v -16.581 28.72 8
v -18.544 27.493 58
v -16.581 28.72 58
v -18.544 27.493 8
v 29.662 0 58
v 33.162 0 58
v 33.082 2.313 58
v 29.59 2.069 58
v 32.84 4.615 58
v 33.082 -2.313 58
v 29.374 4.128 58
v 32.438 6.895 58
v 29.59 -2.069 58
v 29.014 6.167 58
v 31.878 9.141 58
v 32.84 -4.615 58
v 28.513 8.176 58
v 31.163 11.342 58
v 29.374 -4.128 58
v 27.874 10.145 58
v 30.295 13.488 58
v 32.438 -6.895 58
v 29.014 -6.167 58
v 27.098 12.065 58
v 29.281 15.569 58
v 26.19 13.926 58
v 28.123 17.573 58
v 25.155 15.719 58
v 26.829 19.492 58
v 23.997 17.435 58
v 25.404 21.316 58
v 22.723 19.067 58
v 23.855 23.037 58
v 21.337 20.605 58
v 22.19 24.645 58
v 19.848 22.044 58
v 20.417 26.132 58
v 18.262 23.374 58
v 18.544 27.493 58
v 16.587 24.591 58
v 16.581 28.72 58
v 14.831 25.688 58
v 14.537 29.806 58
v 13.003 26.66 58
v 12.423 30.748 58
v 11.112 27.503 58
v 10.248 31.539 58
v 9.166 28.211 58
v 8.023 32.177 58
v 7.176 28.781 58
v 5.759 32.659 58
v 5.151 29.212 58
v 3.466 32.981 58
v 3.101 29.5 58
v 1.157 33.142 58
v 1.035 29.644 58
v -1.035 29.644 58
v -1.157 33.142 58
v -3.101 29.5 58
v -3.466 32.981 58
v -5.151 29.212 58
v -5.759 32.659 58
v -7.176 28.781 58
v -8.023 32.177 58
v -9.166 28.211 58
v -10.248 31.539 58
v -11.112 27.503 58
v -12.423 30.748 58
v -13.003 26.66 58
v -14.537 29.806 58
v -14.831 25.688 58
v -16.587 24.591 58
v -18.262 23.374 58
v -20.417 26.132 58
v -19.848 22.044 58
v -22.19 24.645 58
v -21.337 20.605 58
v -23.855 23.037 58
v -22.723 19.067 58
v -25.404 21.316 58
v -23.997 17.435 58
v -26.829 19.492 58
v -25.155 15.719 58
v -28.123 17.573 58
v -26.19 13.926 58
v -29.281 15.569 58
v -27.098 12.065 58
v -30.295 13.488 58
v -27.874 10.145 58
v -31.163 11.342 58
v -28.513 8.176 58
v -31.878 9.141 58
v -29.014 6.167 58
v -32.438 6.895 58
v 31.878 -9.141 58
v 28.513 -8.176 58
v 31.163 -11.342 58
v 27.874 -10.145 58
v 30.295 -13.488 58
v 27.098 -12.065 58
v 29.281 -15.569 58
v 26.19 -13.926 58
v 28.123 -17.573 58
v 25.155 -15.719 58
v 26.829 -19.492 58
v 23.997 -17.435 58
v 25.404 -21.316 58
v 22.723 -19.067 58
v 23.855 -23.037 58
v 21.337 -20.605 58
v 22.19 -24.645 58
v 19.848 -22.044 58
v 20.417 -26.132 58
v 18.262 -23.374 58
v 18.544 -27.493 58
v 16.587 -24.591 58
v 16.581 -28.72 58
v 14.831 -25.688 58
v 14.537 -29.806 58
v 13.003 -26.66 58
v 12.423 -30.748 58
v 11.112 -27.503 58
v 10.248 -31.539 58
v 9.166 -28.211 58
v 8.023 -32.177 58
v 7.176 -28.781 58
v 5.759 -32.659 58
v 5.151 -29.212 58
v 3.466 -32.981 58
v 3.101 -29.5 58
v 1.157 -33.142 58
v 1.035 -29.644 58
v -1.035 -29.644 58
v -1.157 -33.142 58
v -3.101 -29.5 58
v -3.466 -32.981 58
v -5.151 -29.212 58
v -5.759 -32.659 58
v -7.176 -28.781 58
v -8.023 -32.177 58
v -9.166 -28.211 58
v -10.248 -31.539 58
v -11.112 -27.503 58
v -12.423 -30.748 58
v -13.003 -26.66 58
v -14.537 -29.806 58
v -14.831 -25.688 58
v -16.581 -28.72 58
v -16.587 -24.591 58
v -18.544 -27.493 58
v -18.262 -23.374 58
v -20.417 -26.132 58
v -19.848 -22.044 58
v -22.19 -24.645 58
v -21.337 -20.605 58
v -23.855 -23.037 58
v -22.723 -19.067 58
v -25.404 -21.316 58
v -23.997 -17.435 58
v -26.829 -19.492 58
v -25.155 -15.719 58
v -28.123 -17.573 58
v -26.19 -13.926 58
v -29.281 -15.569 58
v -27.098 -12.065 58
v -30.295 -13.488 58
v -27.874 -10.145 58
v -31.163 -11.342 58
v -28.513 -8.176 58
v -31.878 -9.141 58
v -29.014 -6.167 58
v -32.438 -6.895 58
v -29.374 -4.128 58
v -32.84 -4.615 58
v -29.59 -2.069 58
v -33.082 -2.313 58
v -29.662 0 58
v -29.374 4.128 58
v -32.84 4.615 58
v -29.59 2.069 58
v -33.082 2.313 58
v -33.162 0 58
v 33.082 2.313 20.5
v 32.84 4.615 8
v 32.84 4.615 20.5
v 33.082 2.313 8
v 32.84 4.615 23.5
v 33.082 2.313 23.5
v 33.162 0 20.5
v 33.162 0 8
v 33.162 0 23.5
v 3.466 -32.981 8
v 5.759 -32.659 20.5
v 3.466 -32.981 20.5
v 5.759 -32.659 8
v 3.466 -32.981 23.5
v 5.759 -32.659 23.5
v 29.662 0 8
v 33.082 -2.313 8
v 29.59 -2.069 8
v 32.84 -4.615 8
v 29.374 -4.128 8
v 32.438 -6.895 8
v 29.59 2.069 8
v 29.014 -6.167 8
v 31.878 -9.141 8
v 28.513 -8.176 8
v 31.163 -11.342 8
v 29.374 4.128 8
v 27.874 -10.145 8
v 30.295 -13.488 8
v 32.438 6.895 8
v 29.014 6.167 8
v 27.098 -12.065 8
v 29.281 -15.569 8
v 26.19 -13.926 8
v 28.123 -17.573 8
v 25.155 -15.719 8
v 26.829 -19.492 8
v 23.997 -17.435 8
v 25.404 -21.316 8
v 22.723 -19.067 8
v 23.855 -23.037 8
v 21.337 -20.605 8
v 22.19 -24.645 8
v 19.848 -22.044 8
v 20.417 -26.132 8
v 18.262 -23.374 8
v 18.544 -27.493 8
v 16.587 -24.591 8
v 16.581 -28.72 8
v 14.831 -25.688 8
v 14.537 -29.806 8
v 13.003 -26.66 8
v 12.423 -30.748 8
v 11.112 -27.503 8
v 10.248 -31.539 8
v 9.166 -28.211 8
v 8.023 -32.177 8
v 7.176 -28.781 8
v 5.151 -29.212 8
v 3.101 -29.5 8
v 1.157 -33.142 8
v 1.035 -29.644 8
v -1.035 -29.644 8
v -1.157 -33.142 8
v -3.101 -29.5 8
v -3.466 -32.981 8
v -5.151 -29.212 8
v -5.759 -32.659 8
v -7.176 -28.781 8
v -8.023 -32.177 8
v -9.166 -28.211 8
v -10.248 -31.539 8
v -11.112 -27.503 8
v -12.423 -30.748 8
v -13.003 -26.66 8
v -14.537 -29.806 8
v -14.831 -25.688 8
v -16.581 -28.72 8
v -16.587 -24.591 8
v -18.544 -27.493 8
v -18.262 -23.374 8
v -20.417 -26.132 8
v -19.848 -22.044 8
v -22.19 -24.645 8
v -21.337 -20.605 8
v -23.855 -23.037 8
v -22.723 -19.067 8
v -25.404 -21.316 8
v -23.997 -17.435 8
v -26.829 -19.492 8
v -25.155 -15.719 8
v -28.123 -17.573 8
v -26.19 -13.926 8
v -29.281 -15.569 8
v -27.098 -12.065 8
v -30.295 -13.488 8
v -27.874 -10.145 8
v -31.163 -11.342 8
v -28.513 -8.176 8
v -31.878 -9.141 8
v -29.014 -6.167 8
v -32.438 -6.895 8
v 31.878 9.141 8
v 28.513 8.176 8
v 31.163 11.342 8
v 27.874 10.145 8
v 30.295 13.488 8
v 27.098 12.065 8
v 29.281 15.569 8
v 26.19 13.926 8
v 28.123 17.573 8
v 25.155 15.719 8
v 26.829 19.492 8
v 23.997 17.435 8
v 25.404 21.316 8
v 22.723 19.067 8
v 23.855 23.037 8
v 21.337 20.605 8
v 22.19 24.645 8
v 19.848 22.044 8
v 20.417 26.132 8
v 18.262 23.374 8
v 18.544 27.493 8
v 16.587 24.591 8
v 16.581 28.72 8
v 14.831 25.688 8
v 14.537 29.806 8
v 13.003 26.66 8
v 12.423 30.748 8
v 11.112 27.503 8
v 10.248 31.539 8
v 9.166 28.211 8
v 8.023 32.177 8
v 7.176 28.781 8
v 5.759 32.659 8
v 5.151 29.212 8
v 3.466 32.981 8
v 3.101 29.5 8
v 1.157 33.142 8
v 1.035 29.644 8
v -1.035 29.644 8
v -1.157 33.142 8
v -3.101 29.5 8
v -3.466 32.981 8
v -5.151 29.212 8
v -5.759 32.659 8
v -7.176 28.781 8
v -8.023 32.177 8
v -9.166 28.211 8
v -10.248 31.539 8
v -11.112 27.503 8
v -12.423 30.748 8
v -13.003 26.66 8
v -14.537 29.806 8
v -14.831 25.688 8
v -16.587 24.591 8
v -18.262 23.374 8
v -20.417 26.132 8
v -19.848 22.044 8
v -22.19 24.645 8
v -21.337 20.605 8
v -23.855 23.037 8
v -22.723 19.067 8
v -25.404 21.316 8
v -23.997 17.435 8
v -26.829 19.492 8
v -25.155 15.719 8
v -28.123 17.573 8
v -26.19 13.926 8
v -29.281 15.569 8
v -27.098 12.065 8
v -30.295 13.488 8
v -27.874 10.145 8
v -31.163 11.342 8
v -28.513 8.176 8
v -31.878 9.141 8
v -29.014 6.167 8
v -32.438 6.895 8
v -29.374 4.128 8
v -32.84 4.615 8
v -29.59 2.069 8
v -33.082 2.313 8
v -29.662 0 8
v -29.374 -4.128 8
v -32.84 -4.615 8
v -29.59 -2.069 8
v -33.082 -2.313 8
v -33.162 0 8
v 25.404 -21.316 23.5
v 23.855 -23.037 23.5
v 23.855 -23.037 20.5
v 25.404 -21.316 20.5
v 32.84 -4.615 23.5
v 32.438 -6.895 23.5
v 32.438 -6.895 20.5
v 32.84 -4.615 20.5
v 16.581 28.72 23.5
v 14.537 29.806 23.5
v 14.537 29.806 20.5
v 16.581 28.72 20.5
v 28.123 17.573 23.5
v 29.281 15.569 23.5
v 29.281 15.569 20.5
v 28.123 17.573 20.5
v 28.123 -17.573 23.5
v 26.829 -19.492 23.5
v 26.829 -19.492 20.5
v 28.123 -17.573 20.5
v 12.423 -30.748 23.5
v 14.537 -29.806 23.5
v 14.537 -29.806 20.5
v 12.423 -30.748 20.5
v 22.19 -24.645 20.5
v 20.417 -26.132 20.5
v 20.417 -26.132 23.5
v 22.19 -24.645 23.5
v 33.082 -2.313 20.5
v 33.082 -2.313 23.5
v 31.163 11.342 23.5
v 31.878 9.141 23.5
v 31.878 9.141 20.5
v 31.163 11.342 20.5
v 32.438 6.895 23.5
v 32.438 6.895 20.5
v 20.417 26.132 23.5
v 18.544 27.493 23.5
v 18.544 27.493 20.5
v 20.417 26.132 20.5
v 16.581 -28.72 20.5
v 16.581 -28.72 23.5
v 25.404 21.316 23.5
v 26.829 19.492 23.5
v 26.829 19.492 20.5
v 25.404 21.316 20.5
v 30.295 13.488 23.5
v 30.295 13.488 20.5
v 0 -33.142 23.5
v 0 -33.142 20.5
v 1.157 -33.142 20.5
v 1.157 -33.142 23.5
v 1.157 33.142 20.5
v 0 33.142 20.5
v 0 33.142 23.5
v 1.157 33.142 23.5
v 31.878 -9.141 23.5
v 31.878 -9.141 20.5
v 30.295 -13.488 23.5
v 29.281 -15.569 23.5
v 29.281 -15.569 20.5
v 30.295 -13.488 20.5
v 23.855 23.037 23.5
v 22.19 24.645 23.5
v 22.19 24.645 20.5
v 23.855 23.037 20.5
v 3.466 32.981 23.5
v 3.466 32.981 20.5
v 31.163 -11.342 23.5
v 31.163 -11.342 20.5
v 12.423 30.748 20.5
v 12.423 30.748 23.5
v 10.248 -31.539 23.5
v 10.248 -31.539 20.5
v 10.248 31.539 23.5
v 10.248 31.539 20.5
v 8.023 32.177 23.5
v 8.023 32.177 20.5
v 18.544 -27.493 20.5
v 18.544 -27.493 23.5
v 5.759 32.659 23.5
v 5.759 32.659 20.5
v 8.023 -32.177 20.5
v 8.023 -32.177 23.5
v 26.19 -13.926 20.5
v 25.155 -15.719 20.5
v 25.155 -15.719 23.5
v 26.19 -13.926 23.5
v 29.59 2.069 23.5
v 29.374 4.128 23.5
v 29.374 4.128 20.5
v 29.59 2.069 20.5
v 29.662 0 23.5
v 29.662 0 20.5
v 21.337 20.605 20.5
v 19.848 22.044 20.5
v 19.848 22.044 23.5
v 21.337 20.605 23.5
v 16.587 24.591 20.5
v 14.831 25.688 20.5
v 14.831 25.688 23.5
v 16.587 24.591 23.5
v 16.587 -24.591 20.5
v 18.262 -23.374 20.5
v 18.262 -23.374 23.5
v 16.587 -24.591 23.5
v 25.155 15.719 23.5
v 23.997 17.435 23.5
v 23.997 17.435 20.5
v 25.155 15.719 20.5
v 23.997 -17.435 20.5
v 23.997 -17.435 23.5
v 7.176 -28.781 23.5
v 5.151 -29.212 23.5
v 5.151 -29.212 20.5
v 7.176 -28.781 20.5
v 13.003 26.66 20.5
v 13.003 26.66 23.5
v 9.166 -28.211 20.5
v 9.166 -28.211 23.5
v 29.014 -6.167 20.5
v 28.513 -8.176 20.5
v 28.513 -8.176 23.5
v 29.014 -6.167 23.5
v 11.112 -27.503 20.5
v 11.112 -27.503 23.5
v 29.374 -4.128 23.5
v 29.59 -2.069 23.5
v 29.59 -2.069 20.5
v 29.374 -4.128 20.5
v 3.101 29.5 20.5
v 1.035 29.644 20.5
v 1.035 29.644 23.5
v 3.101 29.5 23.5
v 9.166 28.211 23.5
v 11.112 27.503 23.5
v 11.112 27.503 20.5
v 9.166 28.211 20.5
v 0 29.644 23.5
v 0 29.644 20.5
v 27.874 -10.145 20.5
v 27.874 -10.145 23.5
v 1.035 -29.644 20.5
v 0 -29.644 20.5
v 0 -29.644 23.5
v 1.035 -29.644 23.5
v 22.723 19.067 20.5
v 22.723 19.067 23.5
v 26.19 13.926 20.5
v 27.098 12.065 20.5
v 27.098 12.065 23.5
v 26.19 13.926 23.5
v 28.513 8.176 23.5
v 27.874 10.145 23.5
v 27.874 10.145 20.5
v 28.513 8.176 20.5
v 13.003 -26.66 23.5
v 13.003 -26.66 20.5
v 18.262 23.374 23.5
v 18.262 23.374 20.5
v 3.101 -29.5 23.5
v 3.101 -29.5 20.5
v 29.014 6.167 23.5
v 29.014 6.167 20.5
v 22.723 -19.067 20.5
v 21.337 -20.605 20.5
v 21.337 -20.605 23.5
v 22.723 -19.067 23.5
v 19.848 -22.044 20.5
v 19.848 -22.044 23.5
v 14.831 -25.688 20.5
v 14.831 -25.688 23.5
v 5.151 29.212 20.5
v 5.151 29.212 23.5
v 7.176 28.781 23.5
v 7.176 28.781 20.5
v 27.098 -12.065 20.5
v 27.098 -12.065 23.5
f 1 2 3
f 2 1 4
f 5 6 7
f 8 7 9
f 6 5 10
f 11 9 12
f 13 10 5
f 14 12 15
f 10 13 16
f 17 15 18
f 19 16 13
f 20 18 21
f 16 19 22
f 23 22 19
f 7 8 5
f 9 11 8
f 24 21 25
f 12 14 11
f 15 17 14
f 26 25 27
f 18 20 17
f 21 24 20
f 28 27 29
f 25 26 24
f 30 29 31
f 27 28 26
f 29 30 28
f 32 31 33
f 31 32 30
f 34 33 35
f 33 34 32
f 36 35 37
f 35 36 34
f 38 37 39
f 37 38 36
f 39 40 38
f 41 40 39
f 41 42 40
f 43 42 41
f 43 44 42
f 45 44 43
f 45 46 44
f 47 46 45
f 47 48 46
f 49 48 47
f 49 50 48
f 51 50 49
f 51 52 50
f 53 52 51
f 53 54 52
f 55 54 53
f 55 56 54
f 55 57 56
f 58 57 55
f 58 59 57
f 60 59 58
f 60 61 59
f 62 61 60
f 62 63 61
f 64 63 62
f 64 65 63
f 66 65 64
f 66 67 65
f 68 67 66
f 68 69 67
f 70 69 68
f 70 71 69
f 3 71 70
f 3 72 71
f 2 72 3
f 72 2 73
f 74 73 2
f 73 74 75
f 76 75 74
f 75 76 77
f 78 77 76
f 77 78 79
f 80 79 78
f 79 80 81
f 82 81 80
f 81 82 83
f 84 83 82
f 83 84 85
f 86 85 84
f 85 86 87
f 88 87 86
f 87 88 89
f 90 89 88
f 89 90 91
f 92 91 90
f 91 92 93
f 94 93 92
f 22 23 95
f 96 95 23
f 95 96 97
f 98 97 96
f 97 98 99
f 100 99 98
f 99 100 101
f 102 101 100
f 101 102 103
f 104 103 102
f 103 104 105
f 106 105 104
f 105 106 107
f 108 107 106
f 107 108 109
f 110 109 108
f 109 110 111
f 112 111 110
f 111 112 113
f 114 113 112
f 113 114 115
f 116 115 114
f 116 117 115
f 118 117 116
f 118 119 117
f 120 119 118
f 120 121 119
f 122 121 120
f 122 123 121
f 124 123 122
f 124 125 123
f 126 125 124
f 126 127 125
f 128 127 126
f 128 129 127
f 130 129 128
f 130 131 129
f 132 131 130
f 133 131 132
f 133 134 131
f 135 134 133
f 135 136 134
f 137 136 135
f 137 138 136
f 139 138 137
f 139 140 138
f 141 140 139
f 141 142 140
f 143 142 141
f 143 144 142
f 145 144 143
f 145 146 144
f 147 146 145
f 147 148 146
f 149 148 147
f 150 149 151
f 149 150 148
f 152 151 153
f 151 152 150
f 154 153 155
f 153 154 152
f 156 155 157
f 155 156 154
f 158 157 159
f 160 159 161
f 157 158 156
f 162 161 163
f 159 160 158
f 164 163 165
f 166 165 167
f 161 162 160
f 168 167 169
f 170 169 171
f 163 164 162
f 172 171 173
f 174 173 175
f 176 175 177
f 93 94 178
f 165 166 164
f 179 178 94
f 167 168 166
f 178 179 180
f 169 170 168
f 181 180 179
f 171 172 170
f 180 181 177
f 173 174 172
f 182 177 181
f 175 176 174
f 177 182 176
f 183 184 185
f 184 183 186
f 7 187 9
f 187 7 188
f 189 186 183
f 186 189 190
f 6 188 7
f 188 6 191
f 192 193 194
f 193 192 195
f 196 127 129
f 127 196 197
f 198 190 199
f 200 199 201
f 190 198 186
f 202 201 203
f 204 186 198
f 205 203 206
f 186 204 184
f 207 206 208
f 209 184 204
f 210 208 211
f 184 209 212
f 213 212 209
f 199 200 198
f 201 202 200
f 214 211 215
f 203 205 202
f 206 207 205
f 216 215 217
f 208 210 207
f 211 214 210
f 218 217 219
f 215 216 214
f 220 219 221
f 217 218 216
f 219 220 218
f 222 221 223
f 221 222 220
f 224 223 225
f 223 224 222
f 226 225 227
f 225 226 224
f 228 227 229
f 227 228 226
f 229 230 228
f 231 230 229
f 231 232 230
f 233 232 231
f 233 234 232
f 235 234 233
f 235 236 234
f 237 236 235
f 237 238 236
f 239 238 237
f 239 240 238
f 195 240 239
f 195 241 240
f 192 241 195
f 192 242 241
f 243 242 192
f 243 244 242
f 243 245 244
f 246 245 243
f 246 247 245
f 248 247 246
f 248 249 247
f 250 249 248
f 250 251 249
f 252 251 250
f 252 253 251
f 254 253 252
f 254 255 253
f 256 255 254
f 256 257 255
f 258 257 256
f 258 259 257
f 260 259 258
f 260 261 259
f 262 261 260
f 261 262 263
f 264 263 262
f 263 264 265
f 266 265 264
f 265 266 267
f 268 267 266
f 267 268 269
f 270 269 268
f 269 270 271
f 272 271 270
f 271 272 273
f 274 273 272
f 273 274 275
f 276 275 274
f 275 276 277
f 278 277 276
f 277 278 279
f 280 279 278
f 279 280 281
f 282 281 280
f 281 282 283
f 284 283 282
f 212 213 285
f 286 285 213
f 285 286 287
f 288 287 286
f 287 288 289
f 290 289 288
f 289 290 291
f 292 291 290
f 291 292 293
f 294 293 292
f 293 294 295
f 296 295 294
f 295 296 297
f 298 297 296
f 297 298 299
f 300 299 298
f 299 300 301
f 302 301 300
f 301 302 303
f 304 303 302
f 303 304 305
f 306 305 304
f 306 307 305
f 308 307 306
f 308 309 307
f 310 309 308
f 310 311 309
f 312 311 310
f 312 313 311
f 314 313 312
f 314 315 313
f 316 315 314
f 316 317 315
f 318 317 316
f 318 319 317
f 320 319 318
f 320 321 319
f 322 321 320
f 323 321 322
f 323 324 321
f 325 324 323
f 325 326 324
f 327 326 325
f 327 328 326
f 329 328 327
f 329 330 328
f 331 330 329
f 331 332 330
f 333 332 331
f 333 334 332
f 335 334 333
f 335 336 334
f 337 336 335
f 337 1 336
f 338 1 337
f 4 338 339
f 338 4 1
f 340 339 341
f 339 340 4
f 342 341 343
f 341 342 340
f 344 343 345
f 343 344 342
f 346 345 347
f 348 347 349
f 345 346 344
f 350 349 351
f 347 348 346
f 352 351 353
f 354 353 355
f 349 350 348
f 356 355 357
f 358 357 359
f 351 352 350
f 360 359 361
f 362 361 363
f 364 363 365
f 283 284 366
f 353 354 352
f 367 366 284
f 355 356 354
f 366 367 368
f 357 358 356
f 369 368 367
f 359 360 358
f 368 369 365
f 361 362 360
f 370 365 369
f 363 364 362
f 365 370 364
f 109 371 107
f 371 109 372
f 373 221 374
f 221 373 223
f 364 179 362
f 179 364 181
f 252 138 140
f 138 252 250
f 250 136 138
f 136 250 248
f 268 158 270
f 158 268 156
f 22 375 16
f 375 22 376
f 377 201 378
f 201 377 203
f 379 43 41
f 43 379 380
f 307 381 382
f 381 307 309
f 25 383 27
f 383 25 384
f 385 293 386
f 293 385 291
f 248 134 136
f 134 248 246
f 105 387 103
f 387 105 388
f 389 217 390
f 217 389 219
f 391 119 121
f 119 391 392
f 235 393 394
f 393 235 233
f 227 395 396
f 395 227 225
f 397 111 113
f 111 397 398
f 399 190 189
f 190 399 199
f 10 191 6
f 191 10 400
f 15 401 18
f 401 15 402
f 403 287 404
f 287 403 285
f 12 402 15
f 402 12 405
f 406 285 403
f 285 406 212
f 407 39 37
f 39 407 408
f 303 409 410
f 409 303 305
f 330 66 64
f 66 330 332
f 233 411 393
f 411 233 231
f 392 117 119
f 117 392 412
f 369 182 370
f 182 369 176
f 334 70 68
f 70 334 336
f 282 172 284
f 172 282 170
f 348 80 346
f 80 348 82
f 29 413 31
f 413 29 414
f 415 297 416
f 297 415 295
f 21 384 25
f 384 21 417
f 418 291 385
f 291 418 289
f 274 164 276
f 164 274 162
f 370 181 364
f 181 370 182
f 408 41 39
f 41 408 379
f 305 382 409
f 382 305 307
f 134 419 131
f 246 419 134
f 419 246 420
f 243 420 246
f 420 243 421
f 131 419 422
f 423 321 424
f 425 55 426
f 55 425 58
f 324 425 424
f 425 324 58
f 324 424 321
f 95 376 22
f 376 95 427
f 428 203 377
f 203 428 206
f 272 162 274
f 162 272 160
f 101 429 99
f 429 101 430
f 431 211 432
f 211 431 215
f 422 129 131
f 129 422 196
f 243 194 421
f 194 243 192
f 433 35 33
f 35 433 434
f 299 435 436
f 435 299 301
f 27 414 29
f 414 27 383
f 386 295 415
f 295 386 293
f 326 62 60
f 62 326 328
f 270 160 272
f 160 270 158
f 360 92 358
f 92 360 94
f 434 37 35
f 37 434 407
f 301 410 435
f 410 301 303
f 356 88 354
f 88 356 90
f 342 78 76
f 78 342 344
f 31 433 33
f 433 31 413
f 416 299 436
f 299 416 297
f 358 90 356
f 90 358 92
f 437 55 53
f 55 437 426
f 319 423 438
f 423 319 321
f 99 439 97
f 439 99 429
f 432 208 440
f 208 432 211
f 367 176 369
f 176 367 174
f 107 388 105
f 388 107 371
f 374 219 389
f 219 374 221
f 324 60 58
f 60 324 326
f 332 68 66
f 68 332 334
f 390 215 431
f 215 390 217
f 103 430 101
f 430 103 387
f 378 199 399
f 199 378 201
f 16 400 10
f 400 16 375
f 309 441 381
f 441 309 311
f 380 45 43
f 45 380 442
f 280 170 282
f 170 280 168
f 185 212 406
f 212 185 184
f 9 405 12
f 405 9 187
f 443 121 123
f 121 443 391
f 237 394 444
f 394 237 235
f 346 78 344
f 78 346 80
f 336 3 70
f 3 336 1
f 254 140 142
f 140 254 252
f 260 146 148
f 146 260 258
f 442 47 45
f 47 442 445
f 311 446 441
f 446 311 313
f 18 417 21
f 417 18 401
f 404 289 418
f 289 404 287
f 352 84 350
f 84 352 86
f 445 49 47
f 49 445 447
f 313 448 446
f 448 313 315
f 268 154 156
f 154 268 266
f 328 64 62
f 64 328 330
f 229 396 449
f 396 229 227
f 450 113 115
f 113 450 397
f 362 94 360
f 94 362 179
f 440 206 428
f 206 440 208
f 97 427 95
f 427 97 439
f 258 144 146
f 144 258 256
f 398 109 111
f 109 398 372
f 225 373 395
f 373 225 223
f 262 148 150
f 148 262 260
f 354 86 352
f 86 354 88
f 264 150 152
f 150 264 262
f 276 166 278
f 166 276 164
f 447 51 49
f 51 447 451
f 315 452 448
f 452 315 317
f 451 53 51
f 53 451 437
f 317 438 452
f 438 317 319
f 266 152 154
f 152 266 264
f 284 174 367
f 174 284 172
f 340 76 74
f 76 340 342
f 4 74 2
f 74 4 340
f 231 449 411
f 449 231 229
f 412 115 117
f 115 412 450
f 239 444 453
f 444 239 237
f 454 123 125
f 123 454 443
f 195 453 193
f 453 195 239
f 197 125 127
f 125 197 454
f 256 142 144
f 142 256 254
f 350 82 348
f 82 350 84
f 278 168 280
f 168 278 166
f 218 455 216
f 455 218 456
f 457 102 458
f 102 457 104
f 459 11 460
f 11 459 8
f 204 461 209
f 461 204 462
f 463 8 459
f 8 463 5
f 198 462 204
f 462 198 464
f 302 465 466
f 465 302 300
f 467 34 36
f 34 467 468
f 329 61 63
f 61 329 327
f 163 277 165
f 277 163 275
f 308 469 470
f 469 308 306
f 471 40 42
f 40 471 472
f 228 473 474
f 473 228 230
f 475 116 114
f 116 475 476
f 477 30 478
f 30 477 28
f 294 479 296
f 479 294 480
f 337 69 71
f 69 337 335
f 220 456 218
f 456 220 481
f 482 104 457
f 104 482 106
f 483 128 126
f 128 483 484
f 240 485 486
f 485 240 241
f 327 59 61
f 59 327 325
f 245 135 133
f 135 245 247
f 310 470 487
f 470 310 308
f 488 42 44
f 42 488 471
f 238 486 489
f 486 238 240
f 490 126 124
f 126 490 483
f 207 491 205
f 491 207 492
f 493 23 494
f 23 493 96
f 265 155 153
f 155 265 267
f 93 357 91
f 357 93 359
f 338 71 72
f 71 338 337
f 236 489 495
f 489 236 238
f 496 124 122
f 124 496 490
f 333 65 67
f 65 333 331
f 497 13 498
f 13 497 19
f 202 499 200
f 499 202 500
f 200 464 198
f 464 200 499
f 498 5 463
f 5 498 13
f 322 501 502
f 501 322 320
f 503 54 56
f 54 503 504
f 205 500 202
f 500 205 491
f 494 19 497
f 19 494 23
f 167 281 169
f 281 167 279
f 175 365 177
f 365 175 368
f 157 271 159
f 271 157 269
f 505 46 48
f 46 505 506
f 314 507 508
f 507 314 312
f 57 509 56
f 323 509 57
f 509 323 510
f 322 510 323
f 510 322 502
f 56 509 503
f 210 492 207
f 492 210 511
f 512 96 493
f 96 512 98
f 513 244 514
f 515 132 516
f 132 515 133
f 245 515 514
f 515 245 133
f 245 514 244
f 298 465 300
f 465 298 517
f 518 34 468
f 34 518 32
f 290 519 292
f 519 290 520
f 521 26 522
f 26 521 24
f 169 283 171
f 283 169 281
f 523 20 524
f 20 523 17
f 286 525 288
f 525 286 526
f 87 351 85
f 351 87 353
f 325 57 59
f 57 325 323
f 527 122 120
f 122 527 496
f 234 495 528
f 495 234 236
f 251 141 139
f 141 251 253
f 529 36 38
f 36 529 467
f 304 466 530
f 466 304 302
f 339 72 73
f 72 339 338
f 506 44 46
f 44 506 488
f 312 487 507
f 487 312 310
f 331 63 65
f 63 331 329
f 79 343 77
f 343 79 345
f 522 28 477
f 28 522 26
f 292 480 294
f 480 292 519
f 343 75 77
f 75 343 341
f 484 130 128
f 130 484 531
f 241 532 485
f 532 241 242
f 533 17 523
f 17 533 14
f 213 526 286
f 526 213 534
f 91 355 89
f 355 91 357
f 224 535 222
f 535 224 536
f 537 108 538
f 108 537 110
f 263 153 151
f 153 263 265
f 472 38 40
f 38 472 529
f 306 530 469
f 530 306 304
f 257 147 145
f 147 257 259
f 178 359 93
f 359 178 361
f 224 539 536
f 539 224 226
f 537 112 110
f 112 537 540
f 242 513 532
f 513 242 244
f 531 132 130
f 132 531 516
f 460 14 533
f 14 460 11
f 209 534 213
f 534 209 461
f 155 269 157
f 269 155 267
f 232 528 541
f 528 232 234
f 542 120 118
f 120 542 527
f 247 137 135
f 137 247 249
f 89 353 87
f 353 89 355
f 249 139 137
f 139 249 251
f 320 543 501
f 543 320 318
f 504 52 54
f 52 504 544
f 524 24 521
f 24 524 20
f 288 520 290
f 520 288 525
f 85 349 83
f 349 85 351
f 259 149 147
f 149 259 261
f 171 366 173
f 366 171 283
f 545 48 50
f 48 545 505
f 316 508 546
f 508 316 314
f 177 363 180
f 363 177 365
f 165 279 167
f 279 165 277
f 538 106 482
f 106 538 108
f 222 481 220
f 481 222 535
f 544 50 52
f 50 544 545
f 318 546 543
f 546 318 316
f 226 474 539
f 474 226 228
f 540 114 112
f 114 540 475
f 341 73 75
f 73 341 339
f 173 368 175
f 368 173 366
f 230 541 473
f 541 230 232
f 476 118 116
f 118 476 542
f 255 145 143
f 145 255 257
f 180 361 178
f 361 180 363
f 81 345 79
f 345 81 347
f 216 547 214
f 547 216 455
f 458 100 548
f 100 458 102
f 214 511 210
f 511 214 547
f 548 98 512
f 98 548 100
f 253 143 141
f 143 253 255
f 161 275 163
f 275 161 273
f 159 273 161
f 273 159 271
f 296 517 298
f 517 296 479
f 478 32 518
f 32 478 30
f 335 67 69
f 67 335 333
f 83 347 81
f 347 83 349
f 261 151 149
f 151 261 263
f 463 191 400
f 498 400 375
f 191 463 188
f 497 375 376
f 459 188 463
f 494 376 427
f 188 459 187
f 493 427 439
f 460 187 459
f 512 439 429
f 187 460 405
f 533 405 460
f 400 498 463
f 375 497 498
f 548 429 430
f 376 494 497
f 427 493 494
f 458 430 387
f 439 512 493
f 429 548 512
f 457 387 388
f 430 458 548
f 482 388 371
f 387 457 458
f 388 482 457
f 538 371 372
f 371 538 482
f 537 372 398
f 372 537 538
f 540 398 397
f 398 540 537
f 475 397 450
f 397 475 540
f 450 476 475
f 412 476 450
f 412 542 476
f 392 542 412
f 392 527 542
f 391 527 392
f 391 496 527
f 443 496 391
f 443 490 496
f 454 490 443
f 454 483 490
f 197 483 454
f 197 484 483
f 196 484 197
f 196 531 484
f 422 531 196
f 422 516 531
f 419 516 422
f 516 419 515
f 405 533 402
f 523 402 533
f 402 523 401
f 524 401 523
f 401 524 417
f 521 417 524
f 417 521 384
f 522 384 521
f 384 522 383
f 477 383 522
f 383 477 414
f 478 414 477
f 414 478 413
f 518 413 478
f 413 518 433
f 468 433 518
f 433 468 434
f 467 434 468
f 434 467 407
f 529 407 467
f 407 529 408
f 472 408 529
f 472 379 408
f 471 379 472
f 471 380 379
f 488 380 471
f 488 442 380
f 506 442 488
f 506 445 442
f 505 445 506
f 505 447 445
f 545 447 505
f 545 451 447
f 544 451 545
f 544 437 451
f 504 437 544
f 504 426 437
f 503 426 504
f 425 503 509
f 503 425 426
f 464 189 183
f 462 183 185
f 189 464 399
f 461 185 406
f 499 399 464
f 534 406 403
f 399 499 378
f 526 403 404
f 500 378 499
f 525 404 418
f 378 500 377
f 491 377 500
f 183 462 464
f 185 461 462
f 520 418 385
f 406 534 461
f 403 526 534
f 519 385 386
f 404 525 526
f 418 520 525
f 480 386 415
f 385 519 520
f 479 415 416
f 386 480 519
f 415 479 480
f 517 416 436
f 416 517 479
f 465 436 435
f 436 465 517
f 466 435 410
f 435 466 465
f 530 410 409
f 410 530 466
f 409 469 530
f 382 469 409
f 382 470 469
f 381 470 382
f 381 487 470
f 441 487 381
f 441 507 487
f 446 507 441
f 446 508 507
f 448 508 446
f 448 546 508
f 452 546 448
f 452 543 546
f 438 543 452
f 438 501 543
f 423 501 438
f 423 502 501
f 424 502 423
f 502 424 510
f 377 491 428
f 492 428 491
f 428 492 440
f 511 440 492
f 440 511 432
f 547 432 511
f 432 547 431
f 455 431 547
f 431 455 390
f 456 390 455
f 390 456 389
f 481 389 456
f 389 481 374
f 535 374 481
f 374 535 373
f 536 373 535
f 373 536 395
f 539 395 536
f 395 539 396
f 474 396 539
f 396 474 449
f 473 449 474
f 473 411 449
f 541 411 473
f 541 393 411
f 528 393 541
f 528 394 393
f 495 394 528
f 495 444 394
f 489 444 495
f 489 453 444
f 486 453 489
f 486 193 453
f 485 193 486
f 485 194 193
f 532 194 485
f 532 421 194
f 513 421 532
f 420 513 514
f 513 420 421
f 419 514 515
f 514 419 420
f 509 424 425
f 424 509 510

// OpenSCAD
$fn=90;

DIA= (2 + 3/8) * 25.4;
HEIGHT=50;


translate([0, 0, 8])

difference()
{
    color("GREEN", .5)
    cylinder(d = DIA + 6, h = HEIGHT);
    cylinder(d = DIA -1, h = HEIGHT);
    translate([0, -DIA, HEIGHT/4])
    #cube([DIA*2,DIA*2,3]);
}
